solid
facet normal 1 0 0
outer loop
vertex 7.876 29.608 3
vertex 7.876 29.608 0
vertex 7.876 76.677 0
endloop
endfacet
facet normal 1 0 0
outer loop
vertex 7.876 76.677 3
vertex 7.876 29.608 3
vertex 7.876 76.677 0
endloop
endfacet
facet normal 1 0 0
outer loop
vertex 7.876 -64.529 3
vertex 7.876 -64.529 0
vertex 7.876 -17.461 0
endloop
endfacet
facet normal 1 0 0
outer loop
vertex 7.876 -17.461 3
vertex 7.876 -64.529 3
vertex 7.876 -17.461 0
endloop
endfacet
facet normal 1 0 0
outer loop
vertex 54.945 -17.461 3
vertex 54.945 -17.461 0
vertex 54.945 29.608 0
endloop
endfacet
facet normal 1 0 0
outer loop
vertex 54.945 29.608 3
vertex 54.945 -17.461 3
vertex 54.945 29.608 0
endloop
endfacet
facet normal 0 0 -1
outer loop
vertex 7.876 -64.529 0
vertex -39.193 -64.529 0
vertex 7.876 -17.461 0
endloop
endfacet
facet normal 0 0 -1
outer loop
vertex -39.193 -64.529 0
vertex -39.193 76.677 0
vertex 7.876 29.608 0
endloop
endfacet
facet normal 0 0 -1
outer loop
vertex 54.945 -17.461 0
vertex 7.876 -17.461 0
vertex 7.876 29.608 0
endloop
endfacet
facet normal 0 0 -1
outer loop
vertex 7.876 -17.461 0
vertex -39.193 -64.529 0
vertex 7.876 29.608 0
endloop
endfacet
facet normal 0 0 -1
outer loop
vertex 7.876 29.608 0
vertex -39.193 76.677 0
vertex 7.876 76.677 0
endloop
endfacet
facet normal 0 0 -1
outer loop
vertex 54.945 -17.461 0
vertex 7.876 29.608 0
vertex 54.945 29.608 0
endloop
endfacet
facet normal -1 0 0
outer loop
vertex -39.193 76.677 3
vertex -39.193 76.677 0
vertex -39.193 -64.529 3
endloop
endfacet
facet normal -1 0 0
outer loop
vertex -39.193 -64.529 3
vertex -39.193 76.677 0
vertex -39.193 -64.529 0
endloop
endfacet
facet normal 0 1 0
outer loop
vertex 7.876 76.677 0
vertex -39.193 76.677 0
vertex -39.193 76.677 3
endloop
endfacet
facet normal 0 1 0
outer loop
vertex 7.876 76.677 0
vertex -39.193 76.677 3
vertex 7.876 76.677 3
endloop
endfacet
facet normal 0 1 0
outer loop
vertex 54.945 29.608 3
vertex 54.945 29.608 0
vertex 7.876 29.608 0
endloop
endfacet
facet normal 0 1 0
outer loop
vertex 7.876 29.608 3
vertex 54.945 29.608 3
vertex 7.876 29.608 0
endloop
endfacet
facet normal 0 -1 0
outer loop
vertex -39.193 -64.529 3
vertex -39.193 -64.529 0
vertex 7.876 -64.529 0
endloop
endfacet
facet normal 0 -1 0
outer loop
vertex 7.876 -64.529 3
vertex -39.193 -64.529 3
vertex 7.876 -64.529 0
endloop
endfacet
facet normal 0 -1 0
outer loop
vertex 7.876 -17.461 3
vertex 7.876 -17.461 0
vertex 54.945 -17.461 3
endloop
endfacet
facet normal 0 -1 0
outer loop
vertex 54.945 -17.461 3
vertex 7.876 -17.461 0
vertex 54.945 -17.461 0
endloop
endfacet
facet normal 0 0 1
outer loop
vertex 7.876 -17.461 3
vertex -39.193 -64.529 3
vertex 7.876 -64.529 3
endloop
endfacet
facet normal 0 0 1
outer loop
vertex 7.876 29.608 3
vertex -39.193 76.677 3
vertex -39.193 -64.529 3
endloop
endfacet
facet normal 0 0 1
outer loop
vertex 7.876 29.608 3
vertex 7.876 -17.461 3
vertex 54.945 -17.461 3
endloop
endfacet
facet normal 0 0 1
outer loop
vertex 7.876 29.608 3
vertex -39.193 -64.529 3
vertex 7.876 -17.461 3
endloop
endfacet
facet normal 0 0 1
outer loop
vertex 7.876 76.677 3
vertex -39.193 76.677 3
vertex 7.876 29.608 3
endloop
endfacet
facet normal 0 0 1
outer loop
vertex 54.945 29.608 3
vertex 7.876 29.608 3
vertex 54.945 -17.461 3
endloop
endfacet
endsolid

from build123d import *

# Parameters (mm, degrees)
F0_W     = 47.0686554909
F0_H     = 47.0686554909
F1_DEPTH = 3


with BuildPart() as f1:
    # F0 (on Top) → F1 (new body)
    with BuildSketch(Plane.XY):
        with Locations((-15.658213757, 53.1422756612)):
            Rectangle(F0_W, F0_H)
        Polygon((7.8761139885, 29.6079479158), (-39.1925415024, 29.6079479158), (-39.1925415024, -17.4607075751), (7.8761139885, -17.4607075751), (54.9447694793, -17.4607075751), (54.9447694793, 29.6079479158), align=None)
        with Locations((-15.658213757, -40.9950353205)):
            Rectangle(F0_W, F0_H)
    extrude(amount=F1_DEPTH)


solid = f1.part
